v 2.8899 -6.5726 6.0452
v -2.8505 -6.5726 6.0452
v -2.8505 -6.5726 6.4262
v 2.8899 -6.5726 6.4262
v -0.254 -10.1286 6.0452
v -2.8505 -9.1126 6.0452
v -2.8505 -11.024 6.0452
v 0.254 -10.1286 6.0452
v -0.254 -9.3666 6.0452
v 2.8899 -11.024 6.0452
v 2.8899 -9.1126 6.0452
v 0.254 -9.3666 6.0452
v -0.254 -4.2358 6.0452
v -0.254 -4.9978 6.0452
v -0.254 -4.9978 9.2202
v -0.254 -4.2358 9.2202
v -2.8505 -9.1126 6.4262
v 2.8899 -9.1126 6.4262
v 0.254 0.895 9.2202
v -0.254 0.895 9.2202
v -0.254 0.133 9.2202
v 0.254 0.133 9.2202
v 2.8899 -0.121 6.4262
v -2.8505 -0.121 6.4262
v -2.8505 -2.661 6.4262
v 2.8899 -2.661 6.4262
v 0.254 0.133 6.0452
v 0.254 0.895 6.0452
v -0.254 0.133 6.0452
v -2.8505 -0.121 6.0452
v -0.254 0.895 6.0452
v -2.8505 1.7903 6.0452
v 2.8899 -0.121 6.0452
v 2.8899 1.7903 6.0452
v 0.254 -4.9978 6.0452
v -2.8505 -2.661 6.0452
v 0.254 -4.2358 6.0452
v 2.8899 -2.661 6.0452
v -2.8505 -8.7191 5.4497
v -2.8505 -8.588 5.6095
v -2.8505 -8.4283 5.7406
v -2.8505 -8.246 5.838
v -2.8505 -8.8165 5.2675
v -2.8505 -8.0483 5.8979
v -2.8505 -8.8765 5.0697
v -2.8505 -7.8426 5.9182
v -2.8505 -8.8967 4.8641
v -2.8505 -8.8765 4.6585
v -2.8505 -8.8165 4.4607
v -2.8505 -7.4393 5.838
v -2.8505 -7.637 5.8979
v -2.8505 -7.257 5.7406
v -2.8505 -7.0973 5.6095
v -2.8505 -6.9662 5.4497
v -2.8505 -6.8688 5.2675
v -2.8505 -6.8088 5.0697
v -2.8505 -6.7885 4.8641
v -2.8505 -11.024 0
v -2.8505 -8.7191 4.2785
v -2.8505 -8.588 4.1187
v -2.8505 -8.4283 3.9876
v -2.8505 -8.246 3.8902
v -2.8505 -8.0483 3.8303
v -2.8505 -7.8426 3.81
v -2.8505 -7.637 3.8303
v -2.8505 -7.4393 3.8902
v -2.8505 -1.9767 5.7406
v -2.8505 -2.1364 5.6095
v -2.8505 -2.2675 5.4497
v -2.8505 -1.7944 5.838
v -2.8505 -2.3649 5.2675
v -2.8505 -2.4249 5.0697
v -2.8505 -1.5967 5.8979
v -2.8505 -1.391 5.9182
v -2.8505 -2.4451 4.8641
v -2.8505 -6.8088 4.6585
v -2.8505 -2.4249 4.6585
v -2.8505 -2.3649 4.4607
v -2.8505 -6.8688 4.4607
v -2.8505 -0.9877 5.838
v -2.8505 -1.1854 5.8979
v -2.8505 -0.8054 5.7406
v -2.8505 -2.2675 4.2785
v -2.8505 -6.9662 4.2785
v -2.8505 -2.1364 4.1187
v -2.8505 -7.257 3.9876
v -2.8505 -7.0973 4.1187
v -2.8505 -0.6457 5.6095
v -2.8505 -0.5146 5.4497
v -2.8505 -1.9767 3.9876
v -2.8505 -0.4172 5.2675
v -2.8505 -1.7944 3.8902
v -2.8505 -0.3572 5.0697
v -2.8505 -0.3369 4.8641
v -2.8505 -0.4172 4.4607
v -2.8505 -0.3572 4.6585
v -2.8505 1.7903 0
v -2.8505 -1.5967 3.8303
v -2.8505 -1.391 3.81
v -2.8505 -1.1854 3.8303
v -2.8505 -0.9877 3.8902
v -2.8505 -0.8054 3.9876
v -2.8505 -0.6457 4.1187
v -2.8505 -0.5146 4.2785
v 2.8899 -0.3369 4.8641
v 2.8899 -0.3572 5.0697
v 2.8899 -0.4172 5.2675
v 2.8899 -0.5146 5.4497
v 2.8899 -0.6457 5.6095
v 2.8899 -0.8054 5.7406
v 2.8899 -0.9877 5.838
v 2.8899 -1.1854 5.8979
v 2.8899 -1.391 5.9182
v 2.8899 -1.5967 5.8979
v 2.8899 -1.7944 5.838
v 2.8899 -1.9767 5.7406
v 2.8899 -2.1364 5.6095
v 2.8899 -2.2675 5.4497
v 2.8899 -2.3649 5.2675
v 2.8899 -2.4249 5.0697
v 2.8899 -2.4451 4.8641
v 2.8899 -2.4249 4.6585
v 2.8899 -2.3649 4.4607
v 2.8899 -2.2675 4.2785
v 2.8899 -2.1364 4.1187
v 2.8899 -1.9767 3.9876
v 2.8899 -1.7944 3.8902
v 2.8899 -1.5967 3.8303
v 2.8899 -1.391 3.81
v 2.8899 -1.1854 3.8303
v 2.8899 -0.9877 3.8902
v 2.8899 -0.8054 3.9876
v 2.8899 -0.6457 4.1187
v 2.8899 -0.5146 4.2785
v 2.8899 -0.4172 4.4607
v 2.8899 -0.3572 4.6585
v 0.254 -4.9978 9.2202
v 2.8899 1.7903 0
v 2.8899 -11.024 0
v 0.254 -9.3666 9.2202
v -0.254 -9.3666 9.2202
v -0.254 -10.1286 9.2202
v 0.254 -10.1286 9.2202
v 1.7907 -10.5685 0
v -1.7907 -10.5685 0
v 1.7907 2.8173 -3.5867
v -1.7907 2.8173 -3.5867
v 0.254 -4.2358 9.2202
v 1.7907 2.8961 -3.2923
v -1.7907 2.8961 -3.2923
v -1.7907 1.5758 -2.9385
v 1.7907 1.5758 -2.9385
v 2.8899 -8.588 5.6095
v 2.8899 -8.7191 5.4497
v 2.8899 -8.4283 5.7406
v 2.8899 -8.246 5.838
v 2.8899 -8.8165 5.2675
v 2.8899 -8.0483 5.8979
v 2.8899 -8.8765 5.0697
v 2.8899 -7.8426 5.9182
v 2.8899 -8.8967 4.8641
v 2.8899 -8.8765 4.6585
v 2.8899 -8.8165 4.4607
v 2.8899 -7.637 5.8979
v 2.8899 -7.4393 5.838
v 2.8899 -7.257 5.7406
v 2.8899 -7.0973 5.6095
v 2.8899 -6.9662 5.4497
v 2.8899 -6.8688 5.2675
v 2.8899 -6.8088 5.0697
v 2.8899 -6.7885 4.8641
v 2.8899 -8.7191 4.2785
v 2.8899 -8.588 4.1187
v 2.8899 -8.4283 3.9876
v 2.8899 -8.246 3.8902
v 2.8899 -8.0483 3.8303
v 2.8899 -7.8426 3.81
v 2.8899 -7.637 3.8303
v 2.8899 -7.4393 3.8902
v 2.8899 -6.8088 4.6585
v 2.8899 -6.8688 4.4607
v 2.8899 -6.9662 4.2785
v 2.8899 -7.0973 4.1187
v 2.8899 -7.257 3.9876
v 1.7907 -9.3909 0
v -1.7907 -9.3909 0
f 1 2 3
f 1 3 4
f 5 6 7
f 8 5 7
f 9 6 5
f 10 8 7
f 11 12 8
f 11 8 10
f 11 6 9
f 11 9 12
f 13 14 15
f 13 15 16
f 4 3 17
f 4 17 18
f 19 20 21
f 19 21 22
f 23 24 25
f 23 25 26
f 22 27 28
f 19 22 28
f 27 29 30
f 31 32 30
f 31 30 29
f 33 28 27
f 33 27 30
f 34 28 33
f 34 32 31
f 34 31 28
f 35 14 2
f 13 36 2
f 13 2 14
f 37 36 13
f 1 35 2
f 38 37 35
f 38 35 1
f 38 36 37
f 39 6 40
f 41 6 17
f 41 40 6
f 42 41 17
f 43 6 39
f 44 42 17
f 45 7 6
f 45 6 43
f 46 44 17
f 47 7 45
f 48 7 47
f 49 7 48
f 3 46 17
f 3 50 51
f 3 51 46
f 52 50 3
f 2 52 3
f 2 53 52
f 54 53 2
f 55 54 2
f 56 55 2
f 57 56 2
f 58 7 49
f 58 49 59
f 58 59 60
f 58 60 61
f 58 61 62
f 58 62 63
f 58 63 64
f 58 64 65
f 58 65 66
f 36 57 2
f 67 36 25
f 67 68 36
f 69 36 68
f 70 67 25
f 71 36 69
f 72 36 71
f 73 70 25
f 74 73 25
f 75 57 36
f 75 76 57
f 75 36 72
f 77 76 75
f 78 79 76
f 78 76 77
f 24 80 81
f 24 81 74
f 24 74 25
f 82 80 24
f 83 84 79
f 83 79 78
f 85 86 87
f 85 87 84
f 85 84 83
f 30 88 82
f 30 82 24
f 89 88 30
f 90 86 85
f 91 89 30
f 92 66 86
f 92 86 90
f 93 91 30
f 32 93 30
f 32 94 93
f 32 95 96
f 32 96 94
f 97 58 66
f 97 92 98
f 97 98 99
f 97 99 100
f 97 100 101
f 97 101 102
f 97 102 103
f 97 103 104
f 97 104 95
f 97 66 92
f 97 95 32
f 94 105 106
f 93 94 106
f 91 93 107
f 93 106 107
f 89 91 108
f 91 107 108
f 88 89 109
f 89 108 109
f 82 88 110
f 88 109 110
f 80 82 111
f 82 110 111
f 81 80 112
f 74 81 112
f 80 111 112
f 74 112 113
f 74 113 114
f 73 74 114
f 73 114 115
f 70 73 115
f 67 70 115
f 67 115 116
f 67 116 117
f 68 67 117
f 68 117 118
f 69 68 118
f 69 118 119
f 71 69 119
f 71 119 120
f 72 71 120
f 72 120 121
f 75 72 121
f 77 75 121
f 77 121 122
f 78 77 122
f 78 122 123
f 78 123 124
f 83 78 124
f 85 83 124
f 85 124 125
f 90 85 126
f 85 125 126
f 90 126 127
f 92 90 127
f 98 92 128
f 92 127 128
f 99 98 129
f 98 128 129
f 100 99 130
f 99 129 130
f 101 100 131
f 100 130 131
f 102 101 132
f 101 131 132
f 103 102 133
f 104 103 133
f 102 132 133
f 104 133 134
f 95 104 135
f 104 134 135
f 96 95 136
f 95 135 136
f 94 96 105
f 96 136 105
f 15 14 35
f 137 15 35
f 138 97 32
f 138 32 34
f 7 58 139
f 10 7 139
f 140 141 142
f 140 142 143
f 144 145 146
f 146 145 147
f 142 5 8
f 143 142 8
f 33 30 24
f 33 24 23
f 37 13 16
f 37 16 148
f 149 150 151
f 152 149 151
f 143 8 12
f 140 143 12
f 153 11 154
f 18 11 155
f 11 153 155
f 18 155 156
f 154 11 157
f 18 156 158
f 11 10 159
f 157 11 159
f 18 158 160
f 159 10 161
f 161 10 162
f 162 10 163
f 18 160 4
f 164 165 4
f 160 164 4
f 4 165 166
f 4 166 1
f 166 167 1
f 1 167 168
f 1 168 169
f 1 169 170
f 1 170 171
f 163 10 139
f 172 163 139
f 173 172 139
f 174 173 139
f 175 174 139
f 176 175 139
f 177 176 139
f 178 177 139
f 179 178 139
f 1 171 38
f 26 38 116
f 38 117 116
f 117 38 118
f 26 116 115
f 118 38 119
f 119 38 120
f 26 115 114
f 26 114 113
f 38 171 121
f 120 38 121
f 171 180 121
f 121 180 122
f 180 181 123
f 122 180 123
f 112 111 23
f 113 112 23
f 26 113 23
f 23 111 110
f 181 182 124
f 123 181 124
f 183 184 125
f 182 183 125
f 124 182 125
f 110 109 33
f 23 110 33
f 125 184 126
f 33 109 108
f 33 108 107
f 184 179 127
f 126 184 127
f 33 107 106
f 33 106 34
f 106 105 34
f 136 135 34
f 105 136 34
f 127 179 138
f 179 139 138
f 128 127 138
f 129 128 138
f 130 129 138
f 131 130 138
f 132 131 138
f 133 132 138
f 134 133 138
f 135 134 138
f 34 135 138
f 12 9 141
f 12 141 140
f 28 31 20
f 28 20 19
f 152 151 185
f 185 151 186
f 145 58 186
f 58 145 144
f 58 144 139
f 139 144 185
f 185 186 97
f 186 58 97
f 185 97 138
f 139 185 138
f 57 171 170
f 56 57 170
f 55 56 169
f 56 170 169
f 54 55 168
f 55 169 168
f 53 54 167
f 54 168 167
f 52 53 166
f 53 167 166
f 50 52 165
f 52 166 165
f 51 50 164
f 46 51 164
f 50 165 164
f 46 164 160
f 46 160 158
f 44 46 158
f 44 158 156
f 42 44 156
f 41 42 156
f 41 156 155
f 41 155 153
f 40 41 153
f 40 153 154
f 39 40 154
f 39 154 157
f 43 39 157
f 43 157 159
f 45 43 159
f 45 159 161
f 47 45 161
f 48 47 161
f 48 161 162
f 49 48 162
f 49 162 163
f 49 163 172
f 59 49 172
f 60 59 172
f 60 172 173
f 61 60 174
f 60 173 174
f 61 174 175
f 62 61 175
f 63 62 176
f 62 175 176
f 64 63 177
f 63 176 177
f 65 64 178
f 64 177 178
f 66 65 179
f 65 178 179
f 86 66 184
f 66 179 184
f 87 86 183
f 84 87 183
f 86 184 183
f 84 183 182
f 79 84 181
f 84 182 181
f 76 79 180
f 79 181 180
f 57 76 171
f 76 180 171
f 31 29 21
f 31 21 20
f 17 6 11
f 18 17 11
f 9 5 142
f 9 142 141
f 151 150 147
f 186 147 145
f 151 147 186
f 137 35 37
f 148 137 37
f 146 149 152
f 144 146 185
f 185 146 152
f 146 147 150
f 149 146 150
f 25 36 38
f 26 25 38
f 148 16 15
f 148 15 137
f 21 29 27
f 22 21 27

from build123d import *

# Parameters (mm, degrees)
SKETCH2_W           = 5.7404
SKETCH2_H           = 12.8143
OG_BOX_DEPTH        = 6.0452
SKETCH4_W           = 0.508
SKETCH4_H           = 0.762
PINS_DEPTH          = 3.175
CLICKER_DEPTH       = 3.5814
SKETCH8_W           = 5.7404
SKETCH8_H           = 2.54
BOSS_EXTRUDE3_DEPTH = 0.381
SKETCH9_R           = 1.0541
CUT_EXTRUDE1_DEPTH  = 8.89


with BuildPart() as part:
    # Sketch2 → OG box (new body)
    with BuildSketch(Plane.XY):
        with Locations((0.019740217, -4.616841123)):
            Rectangle(SKETCH2_W, SKETCH2_H)
    extrude(amount=OG_BOX_DEPTH)

    # Sketch4 → Pins (add)
    with BuildSketch(Plane.XY.offset(6.0452)):
        with Locations((0, -4.616841123)):
            Rectangle(SKETCH4_W, SKETCH4_H)
        with Locations((0, 0.513958877)):
            Rectangle(SKETCH4_W, SKETCH4_H)
        with Locations((0, -9.747641123)):
            Rectangle(SKETCH4_W, SKETCH4_H)
    extrude(amount=PINS_DEPTH)

    # Sketch6 → Clicker (add)
    with BuildSketch(Plane.ZY.offset(1.7907)):
        Polygon((0, -10.56854726), (-3.5867143, 2.81725274), (-3.292300108, 2.896140785), (-2.938516926, 1.575803975), (0, -9.390890493), align=None)
    extrude(amount=-CLICKER_DEPTH)

    # Sketch8 → Boss-Extrude3 (add)
    with BuildSketch(Plane.XY.offset(6.0452)):
        with Locations((0.019740217, -1.391041123)):
            Rectangle(SKETCH8_W, SKETCH8_H)
        with Locations((0.019740217, -7.842641123)):
            Rectangle(SKETCH8_W, SKETCH8_H)
    extrude(amount=BOSS_EXTRUDE3_DEPTH)

    # Sketch9 → Cut-Extrude1 (cut)
    with BuildSketch(Plane(origin=(2.889940217, 0, 0), x_dir=(0, 0, -1), z_dir=(1, 0, 0))):
        with Locations(Location((-4.8641, -1.391041123, 0), (0, 0, 90))):
            Circle(SKETCH9_R)
        with Locations(Location((-4.8641, -7.842641123, 0), (0, 0, 90))):
            Circle(SKETCH9_R)
    extrude(amount=-CUT_EXTRUDE1_DEPTH, mode=Mode.SUBTRACT)


solid = part.part
